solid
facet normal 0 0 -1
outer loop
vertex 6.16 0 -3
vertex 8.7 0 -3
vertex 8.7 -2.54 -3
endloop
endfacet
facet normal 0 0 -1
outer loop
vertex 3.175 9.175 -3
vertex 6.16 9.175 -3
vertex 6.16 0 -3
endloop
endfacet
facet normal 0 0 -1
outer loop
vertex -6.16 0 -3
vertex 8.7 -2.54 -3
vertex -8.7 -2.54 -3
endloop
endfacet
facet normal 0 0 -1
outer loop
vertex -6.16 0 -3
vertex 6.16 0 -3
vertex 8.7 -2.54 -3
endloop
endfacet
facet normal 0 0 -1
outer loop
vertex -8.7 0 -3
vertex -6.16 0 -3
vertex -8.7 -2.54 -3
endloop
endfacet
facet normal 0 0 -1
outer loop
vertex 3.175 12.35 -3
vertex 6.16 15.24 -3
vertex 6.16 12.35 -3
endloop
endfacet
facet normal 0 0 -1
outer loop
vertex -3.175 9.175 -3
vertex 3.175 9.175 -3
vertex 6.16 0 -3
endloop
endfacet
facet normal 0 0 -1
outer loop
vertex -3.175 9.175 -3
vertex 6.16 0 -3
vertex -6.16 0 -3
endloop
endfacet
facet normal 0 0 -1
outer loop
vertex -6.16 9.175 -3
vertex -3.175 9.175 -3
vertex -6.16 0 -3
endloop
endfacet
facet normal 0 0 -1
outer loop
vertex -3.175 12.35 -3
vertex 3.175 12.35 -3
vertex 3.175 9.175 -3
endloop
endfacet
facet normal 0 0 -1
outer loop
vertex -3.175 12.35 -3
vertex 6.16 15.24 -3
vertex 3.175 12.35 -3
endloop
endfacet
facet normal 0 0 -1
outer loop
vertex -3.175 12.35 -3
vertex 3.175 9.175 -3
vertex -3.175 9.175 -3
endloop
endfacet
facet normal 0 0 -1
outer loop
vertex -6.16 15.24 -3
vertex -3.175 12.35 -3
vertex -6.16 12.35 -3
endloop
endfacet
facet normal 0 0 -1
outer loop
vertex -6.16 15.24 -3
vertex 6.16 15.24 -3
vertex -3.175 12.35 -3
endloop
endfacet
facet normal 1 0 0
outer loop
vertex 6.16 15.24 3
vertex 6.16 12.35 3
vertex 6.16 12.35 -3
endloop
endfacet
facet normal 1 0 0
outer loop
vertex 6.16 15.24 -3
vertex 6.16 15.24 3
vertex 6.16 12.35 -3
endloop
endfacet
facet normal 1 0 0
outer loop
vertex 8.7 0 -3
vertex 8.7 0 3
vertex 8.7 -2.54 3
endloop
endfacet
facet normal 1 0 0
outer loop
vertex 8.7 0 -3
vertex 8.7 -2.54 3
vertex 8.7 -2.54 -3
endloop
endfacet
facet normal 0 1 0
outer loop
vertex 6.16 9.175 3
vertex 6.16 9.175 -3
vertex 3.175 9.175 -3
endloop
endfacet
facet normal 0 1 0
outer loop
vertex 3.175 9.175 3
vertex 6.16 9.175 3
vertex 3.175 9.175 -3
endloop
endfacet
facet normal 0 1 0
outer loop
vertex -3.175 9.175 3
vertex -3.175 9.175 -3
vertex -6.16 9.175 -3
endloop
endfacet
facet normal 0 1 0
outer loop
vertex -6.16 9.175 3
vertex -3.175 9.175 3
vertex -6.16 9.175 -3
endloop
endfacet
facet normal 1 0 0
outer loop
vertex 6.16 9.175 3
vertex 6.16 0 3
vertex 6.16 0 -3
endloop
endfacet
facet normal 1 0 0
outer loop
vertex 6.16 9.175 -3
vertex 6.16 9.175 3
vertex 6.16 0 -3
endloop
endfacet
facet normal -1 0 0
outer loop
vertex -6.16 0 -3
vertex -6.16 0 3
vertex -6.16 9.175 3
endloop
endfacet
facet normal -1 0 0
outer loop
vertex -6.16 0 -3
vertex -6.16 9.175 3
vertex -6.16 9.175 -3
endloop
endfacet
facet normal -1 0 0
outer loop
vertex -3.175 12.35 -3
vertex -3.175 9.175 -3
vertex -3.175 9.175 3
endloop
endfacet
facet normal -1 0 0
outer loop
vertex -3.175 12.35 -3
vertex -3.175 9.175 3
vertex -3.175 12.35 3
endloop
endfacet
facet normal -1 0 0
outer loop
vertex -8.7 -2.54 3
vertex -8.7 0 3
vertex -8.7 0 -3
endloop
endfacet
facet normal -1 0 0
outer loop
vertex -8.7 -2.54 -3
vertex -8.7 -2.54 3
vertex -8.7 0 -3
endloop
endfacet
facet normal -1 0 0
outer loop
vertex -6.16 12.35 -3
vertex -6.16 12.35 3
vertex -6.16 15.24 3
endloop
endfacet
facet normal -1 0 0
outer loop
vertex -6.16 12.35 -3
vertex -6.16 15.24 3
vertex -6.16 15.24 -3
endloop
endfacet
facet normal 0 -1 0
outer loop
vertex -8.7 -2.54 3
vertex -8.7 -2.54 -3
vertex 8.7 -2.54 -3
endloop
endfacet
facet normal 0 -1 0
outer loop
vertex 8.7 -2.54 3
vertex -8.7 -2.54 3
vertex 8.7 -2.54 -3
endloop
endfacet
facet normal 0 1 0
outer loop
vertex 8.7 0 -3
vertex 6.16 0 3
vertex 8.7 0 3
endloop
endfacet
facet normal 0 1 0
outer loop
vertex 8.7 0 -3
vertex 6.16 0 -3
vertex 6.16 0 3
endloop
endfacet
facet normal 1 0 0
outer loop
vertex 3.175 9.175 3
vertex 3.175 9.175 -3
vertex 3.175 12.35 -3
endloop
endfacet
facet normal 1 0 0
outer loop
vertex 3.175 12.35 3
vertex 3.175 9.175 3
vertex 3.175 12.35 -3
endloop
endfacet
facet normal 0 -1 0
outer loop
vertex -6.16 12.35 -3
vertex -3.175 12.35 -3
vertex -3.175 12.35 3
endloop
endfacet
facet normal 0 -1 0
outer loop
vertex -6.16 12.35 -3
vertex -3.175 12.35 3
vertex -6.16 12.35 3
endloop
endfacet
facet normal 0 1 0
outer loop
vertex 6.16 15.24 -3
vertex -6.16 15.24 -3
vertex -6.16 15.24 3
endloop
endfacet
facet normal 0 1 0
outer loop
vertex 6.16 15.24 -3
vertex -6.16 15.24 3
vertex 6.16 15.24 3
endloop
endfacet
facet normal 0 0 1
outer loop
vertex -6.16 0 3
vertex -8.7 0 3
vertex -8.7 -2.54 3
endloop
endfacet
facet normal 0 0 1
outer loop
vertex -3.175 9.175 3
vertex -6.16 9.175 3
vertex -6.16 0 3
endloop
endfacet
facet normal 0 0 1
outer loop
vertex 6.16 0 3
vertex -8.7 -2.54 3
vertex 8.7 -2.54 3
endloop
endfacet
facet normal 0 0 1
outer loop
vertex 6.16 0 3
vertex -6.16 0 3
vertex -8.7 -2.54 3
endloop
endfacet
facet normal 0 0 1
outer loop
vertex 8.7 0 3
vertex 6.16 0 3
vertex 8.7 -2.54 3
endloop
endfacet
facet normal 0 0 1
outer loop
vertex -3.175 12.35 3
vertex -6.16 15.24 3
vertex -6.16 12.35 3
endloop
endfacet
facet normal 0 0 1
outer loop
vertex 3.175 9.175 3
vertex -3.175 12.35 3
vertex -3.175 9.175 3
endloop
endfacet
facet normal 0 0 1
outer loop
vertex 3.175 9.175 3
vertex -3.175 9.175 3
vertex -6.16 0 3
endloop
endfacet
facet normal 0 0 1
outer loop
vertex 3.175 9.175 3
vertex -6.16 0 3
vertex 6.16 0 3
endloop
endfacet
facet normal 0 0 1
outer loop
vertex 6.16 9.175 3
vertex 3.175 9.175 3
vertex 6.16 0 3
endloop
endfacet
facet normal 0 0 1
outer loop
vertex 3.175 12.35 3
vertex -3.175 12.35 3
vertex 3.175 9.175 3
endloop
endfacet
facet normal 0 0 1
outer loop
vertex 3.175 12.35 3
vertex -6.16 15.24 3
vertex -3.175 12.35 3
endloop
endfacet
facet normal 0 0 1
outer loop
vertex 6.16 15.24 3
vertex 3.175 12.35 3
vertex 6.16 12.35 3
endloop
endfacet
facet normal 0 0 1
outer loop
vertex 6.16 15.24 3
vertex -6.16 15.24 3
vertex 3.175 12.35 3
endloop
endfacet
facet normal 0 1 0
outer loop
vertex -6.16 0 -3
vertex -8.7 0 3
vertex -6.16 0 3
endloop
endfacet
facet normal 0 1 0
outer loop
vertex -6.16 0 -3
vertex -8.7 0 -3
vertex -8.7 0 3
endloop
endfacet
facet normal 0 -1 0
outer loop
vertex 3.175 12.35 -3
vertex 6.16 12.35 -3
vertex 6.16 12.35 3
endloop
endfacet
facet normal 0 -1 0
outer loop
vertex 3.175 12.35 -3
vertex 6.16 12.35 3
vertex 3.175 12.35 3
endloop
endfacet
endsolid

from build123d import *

# Parameters (mm, degrees)
SKETCH1_W           = 12.319
SKETCH1_H           = 6
BOSS_EXTRUDE1_DEPTH = 15.24
SKETCH1_3_W         = 17.399
SKETCH1_3_H         = 6
BOSS_EXTRUDE2_DEPTH = 2.54
SKETCH2_W           = 2.9845
SKETCH2_H           = 3.175
CUT_EXTRUDE1_DEPTH  = 19.545589779


with BuildPart() as part:
    # Sketch1 → Boss-Extrude1 (new body)
    with BuildSketch(Plane(origin=(0, 0, 0), x_dir=(1, 0, 0), z_dir=(0, 1, 0))):
        Rectangle(SKETCH1_W, SKETCH1_H)
    extrude(amount=BOSS_EXTRUDE1_DEPTH)

    # Sketch1<3> → Boss-Extrude2 (add)
    with BuildSketch(Plane(origin=(0, 0, 0), x_dir=(1, 0, 0), z_dir=(0, 1, 0))):
        Rectangle(SKETCH1_3_W, SKETCH1_3_H)
    extrude(amount=-BOSS_EXTRUDE2_DEPTH)

    # Sketch2 → Cut-Extrude1 (cut, through all)
    with BuildSketch(Plane(origin=(0, 0, -3), x_dir=(-1, 0, 0), z_dir=(0, 0, -1))):
        with Locations((-4.66725, 10.7625)):
            Rectangle(SKETCH2_W, SKETCH2_H)
        with Locations((4.66725, 10.7625)):
            Rectangle(SKETCH2_W, SKETCH2_H)
    extrude(amount=-CUT_EXTRUDE1_DEPTH, mode=Mode.SUBTRACT)


solid = part.part
